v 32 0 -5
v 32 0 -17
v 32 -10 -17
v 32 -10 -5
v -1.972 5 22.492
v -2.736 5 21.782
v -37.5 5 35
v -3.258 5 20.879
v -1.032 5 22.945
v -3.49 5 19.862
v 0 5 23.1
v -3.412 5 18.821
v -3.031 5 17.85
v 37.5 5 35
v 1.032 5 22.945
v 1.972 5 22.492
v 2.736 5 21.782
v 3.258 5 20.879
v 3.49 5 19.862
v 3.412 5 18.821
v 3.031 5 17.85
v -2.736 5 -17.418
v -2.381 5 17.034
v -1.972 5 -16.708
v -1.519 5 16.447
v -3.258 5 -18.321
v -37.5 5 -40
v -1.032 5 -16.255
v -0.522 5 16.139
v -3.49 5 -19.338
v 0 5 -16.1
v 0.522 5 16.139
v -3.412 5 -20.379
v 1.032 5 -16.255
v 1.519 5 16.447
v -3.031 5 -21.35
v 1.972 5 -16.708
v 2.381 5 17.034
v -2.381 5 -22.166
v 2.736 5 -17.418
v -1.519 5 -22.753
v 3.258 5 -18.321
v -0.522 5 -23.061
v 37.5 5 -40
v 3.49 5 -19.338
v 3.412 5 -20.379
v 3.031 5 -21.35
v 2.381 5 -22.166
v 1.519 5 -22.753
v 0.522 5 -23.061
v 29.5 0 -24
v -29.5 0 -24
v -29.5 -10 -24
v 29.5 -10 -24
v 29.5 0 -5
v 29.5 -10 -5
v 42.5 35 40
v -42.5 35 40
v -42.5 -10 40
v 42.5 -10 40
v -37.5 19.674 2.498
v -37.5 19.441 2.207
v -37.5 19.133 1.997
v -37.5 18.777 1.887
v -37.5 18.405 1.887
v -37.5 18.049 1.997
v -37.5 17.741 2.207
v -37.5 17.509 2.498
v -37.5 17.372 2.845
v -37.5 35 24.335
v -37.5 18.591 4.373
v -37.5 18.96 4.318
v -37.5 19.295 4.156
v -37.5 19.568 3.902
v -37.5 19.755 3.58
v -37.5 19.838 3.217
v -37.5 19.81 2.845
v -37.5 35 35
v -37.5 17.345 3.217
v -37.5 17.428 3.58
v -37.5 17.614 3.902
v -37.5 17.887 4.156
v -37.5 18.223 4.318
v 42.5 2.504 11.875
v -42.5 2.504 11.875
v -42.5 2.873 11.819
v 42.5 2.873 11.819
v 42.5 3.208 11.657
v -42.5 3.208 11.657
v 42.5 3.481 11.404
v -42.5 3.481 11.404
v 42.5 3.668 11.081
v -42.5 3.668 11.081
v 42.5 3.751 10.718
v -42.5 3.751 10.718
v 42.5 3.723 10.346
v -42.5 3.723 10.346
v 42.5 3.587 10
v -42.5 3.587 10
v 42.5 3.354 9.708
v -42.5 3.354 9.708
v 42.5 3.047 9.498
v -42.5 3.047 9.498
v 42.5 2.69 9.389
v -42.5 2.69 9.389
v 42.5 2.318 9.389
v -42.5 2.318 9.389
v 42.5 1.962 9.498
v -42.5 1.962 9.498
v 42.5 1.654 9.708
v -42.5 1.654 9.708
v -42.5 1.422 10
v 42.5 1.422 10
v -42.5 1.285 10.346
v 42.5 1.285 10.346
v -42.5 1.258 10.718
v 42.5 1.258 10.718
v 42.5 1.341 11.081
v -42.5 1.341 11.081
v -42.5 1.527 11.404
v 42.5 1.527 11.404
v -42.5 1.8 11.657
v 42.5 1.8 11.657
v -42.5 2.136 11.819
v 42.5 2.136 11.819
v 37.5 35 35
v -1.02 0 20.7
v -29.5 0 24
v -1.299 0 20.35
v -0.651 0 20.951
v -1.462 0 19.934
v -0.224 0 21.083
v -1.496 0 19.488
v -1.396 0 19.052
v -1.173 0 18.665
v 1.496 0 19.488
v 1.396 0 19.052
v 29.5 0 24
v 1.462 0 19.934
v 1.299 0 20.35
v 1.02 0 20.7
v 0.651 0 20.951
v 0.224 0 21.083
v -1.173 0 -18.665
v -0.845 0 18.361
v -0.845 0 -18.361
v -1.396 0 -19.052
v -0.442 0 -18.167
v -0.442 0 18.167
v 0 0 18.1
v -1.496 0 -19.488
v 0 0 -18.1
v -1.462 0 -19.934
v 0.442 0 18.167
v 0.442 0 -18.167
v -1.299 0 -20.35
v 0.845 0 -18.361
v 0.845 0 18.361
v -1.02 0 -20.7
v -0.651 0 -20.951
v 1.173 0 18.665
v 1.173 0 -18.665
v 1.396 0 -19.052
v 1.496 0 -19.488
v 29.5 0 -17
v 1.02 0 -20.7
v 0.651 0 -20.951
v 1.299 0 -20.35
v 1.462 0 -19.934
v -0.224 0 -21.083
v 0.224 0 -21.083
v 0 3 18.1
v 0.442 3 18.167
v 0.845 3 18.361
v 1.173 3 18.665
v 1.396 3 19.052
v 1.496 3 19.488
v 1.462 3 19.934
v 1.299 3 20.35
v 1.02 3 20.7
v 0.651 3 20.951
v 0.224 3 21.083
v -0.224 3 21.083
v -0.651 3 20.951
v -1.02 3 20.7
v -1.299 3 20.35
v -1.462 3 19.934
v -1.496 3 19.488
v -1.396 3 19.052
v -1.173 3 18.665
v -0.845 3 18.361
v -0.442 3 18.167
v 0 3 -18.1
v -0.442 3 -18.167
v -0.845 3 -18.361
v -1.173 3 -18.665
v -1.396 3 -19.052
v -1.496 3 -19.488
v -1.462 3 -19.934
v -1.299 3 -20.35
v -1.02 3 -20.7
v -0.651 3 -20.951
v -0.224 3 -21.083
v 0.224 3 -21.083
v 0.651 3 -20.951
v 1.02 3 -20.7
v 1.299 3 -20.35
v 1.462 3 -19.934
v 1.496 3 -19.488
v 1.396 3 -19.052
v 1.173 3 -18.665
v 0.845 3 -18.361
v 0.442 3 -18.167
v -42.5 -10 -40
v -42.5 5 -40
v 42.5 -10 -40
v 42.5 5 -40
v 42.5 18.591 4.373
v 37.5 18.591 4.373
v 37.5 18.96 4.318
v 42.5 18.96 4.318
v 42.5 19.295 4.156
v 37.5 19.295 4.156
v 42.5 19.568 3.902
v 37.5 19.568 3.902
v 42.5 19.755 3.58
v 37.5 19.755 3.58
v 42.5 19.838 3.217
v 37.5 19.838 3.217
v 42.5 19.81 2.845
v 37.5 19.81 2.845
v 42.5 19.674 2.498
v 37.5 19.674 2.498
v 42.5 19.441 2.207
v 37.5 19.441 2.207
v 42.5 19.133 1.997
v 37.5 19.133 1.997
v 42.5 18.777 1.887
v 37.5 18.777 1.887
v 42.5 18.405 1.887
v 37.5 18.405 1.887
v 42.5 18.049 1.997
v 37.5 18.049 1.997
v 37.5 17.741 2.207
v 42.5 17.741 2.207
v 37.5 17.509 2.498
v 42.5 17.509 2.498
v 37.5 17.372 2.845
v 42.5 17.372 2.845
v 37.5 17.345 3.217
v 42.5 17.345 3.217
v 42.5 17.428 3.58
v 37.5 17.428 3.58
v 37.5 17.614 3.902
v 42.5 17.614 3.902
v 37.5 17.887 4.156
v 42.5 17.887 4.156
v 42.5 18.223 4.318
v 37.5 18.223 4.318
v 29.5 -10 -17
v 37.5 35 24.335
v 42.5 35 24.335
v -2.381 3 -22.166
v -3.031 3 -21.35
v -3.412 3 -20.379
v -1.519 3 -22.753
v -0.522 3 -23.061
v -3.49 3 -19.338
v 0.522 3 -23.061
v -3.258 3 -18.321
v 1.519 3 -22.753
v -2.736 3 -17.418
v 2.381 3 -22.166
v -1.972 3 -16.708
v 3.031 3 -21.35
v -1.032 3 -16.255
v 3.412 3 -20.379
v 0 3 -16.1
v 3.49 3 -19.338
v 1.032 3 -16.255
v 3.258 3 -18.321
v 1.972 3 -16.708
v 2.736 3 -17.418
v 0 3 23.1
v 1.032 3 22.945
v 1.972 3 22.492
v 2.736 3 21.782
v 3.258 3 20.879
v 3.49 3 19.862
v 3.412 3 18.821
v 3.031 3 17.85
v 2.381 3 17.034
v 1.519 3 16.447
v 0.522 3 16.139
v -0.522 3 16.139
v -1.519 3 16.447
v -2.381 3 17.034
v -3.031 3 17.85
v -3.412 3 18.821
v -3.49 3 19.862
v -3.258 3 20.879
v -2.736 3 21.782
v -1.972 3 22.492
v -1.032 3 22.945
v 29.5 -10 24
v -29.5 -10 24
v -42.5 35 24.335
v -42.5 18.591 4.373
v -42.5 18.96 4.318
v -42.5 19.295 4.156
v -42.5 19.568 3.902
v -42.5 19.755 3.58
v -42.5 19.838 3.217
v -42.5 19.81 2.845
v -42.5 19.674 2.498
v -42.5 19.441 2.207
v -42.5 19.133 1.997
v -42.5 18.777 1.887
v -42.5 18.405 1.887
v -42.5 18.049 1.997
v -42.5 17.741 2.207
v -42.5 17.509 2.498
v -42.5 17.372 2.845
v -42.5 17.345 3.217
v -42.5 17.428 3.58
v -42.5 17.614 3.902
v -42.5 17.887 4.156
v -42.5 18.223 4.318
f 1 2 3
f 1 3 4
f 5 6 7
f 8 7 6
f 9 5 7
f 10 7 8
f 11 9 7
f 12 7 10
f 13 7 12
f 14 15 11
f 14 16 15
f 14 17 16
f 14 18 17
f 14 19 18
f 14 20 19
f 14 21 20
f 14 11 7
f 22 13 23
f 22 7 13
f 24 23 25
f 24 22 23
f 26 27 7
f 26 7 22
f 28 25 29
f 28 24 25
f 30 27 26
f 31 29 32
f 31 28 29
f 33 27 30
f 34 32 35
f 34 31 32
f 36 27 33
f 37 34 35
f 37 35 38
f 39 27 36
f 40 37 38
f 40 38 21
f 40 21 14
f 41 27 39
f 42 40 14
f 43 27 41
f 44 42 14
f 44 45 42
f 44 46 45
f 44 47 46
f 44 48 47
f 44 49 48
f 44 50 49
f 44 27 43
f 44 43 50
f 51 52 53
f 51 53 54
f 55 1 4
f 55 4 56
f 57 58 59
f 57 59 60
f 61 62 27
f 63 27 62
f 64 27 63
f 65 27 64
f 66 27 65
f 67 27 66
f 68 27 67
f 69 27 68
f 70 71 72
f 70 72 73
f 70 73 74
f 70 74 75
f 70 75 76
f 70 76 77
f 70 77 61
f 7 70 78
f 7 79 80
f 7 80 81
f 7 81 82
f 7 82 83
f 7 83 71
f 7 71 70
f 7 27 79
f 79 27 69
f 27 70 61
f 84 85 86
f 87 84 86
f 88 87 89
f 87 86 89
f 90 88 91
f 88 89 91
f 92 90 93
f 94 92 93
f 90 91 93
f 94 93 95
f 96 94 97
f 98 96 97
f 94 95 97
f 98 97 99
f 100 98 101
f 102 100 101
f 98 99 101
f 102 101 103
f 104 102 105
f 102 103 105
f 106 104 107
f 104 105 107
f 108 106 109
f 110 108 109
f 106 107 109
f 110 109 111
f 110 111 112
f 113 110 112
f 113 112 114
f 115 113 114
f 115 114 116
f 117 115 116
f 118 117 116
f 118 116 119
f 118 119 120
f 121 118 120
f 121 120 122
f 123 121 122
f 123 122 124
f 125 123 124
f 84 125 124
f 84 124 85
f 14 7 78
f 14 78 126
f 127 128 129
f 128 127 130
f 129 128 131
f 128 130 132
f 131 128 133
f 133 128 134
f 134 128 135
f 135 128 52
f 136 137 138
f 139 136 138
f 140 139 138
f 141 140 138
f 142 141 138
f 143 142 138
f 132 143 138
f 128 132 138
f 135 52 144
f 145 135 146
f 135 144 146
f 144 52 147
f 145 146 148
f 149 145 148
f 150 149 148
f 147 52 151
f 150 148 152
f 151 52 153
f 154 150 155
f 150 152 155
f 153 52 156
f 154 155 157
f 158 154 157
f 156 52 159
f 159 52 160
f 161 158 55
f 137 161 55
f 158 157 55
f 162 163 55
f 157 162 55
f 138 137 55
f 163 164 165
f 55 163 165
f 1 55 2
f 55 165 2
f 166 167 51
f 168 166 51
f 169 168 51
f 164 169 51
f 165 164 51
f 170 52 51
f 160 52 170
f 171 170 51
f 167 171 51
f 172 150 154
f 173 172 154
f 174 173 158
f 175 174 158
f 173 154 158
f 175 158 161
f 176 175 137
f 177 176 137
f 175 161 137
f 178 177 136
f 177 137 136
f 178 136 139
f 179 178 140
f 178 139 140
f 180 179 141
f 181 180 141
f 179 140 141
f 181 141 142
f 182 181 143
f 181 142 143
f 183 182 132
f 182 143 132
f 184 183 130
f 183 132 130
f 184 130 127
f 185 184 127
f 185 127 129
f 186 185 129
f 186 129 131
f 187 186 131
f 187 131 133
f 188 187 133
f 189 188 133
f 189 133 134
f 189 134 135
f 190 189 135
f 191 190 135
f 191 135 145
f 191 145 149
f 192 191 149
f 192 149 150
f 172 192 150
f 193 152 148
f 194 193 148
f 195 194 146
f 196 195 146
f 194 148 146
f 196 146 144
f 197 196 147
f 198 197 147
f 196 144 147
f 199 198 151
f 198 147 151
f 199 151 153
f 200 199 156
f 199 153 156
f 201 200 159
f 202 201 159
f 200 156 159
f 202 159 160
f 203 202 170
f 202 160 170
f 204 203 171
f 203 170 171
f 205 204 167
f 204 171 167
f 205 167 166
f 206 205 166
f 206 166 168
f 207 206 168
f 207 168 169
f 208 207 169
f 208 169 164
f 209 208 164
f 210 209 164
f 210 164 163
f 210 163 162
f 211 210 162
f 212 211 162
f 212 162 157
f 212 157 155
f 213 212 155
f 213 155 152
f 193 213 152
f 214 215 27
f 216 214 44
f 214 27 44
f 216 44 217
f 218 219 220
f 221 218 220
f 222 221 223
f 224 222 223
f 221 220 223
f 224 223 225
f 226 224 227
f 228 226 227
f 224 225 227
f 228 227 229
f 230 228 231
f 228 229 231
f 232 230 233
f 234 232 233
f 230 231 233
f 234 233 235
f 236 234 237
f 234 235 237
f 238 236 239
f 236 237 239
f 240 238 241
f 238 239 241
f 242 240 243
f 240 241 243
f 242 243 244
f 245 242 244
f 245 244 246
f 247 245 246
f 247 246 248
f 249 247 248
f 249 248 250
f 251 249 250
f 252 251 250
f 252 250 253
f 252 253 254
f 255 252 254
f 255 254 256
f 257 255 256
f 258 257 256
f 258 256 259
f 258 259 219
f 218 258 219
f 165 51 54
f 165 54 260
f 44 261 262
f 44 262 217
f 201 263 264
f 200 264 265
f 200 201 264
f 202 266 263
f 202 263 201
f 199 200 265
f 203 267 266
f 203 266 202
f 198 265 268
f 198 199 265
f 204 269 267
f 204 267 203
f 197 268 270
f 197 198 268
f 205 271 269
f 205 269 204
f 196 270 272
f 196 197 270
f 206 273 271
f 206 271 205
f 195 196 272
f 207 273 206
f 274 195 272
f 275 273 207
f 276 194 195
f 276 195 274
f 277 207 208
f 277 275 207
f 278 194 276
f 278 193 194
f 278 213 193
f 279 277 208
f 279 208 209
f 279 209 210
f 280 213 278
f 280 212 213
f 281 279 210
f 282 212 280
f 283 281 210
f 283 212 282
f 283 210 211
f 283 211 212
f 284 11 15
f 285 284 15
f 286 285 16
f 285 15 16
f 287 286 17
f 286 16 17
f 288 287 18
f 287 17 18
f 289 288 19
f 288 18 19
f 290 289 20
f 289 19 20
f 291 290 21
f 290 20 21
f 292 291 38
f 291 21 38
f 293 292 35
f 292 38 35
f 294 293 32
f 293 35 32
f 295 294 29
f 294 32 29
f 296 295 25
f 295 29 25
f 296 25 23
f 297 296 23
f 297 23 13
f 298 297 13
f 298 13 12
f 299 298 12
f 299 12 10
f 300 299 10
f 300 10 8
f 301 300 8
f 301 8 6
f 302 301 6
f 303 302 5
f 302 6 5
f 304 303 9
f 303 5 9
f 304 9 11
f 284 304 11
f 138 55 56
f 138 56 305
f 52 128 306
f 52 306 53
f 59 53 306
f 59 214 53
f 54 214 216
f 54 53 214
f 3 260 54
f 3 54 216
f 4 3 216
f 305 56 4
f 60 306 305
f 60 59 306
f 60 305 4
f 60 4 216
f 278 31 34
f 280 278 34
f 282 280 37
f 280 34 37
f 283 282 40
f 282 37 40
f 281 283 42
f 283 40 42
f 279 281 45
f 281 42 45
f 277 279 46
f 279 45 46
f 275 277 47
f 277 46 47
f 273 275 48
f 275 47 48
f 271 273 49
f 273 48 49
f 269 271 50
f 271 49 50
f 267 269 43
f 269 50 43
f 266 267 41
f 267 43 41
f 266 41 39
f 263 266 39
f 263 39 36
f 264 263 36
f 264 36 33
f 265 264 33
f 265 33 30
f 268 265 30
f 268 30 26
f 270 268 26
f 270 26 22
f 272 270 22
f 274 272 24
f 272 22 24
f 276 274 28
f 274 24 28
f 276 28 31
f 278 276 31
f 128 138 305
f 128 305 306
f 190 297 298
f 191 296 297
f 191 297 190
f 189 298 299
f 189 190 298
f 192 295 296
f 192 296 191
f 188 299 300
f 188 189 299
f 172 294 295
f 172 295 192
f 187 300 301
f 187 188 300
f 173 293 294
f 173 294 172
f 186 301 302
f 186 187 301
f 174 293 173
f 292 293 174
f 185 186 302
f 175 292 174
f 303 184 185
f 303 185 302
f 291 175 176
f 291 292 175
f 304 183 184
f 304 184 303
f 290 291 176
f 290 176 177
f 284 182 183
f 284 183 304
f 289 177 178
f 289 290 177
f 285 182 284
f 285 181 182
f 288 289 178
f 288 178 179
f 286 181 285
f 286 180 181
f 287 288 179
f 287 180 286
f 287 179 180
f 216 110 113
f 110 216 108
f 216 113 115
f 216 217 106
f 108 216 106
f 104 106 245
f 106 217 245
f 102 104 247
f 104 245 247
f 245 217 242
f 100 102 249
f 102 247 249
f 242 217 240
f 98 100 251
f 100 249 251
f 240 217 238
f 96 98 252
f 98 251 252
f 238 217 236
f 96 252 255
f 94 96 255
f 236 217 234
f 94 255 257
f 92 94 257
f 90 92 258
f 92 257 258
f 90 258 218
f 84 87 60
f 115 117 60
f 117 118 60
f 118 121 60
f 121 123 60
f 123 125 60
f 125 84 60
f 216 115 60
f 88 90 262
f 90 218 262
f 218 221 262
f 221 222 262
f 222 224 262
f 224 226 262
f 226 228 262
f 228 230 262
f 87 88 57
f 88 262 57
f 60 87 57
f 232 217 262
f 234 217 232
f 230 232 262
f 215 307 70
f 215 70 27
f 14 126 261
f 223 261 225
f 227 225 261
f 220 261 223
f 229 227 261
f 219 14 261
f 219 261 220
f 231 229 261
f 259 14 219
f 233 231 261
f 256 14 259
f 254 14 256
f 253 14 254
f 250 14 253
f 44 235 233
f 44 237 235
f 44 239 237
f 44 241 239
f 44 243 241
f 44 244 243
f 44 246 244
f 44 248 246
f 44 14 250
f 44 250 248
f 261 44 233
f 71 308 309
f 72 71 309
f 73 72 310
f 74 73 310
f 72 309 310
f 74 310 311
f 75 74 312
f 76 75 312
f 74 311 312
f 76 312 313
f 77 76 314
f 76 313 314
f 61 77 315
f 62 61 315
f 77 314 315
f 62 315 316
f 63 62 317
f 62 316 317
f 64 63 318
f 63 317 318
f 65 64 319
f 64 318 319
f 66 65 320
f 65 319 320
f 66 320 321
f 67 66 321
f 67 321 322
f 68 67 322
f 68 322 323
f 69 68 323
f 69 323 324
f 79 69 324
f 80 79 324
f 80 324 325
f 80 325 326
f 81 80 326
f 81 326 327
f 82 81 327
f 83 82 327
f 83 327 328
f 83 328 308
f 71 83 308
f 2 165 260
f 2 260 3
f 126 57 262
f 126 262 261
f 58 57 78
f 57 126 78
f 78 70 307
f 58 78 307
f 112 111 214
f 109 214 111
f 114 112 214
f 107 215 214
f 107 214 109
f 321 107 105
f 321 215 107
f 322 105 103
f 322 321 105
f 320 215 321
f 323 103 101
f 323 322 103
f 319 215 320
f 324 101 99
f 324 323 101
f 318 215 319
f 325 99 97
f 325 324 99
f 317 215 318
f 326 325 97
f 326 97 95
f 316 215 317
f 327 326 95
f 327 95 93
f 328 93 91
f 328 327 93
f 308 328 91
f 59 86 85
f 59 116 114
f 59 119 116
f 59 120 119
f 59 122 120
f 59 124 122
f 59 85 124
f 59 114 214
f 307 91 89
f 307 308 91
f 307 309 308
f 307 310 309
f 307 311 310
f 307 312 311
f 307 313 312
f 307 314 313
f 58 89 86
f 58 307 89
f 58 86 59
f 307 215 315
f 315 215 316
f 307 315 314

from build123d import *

# Parameters (mm, degrees)
SKETCH1_W           = 85
SKETCH1_H           = 80
BOSS_EXTRUDE1_DEPTH = 5
SKETCH2_R           = 1.5
CUT_EXTRUDE1_DEPTH  = 59.576872569
BOSS_EXTRUDE3_DEPTH = 30
SKETCH5_R           = 3.5
CUT_EXTRUDE2_DEPTH  = 2
SKETCH6_R           = 1.25
CUT_EXTRUDE3_DEPTH  = 101.249688279
SKETCH3_W           = 85
SKETCH3_H           = 80
BOSS_EXTRUDE4_DEPTH = 10


with BuildPart() as part:
    # Sketch1 → Boss-Extrude1 (new body)
    with BuildSketch(Plane(origin=(0, 0, 0), x_dir=(1, 0, 0), z_dir=(0, 1, 0))):
        Rectangle(SKETCH1_W, SKETCH1_H)
    extrude(amount=BOSS_EXTRUDE1_DEPTH)

    # Sketch2 → Cut-Extrude1 (cut, through all)
    with BuildSketch(Plane.XZ):
        with Locations(Location((0, 19.6, 0), (0, 0, 270))):
            Circle(SKETCH2_R)
        with Locations(Location((0, -19.6, 0), (0, 0, 90))):
            Circle(SKETCH2_R)
    extrude(amount=-CUT_EXTRUDE1_DEPTH, mode=Mode.SUBTRACT)

    # Sketch4 → Boss-Extrude3 (add)
    with BuildSketch(Plane(origin=(0, 5, 0), x_dir=(1, 0, 0), z_dir=(0, 1, 0))):
        Polygon((-42.5, -40), (-42.5, 40), (-37.5, 40), (-37.5, -35), (37.5, -35), (37.5, 40), (42.5, 40), (42.5, -40), align=None)
    extrude(amount=BOSS_EXTRUDE3_DEPTH)

    # Sketch5 → Cut-Extrude2 (cut)
    with BuildSketch(Plane(origin=(0, 5, 0), x_dir=(1, 0, 0), z_dir=(0, 1, 0))):
        with Locations(Location((0, 19.6, 0), (0, 0, 270))):
            Circle(SKETCH5_R)
        with Locations(Location((0, -19.6, 0), (0, 0, 270))):
            Circle(SKETCH5_R)
    extrude(amount=-CUT_EXTRUDE2_DEPTH, mode=Mode.SUBTRACT)

    # Sketch6 → Cut-Extrude3 (cut, through all)
    with BuildSketch(Plane.ZY.offset(42.5)):
        with Locations((10.624581332, 2.504153155)):
            Circle(SKETCH6_R)
        with Locations((3.123107186, 18.591116375)):
            Circle(SKETCH6_R)
        Polygon((24.335207615, 35), (-40, 5), (-40, 35), align=None)
    extrude(amount=-CUT_EXTRUDE3_DEPTH, mode=Mode.SUBTRACT)

    # Sketch3 → Boss-Extrude4 (add)
    with BuildSketch(Plane.XZ):
        Rectangle(SKETCH3_W, SKETCH3_H)
        Polygon((29.5, -17), (32, -17), (32, -5), (29.5, -5), (29.5, 24), (-29.5, 24), (-29.5, -24), (29.5, -24), align=None, mode=Mode.SUBTRACT)
    extrude(amount=BOSS_EXTRUDE4_DEPTH)


solid = part.part
